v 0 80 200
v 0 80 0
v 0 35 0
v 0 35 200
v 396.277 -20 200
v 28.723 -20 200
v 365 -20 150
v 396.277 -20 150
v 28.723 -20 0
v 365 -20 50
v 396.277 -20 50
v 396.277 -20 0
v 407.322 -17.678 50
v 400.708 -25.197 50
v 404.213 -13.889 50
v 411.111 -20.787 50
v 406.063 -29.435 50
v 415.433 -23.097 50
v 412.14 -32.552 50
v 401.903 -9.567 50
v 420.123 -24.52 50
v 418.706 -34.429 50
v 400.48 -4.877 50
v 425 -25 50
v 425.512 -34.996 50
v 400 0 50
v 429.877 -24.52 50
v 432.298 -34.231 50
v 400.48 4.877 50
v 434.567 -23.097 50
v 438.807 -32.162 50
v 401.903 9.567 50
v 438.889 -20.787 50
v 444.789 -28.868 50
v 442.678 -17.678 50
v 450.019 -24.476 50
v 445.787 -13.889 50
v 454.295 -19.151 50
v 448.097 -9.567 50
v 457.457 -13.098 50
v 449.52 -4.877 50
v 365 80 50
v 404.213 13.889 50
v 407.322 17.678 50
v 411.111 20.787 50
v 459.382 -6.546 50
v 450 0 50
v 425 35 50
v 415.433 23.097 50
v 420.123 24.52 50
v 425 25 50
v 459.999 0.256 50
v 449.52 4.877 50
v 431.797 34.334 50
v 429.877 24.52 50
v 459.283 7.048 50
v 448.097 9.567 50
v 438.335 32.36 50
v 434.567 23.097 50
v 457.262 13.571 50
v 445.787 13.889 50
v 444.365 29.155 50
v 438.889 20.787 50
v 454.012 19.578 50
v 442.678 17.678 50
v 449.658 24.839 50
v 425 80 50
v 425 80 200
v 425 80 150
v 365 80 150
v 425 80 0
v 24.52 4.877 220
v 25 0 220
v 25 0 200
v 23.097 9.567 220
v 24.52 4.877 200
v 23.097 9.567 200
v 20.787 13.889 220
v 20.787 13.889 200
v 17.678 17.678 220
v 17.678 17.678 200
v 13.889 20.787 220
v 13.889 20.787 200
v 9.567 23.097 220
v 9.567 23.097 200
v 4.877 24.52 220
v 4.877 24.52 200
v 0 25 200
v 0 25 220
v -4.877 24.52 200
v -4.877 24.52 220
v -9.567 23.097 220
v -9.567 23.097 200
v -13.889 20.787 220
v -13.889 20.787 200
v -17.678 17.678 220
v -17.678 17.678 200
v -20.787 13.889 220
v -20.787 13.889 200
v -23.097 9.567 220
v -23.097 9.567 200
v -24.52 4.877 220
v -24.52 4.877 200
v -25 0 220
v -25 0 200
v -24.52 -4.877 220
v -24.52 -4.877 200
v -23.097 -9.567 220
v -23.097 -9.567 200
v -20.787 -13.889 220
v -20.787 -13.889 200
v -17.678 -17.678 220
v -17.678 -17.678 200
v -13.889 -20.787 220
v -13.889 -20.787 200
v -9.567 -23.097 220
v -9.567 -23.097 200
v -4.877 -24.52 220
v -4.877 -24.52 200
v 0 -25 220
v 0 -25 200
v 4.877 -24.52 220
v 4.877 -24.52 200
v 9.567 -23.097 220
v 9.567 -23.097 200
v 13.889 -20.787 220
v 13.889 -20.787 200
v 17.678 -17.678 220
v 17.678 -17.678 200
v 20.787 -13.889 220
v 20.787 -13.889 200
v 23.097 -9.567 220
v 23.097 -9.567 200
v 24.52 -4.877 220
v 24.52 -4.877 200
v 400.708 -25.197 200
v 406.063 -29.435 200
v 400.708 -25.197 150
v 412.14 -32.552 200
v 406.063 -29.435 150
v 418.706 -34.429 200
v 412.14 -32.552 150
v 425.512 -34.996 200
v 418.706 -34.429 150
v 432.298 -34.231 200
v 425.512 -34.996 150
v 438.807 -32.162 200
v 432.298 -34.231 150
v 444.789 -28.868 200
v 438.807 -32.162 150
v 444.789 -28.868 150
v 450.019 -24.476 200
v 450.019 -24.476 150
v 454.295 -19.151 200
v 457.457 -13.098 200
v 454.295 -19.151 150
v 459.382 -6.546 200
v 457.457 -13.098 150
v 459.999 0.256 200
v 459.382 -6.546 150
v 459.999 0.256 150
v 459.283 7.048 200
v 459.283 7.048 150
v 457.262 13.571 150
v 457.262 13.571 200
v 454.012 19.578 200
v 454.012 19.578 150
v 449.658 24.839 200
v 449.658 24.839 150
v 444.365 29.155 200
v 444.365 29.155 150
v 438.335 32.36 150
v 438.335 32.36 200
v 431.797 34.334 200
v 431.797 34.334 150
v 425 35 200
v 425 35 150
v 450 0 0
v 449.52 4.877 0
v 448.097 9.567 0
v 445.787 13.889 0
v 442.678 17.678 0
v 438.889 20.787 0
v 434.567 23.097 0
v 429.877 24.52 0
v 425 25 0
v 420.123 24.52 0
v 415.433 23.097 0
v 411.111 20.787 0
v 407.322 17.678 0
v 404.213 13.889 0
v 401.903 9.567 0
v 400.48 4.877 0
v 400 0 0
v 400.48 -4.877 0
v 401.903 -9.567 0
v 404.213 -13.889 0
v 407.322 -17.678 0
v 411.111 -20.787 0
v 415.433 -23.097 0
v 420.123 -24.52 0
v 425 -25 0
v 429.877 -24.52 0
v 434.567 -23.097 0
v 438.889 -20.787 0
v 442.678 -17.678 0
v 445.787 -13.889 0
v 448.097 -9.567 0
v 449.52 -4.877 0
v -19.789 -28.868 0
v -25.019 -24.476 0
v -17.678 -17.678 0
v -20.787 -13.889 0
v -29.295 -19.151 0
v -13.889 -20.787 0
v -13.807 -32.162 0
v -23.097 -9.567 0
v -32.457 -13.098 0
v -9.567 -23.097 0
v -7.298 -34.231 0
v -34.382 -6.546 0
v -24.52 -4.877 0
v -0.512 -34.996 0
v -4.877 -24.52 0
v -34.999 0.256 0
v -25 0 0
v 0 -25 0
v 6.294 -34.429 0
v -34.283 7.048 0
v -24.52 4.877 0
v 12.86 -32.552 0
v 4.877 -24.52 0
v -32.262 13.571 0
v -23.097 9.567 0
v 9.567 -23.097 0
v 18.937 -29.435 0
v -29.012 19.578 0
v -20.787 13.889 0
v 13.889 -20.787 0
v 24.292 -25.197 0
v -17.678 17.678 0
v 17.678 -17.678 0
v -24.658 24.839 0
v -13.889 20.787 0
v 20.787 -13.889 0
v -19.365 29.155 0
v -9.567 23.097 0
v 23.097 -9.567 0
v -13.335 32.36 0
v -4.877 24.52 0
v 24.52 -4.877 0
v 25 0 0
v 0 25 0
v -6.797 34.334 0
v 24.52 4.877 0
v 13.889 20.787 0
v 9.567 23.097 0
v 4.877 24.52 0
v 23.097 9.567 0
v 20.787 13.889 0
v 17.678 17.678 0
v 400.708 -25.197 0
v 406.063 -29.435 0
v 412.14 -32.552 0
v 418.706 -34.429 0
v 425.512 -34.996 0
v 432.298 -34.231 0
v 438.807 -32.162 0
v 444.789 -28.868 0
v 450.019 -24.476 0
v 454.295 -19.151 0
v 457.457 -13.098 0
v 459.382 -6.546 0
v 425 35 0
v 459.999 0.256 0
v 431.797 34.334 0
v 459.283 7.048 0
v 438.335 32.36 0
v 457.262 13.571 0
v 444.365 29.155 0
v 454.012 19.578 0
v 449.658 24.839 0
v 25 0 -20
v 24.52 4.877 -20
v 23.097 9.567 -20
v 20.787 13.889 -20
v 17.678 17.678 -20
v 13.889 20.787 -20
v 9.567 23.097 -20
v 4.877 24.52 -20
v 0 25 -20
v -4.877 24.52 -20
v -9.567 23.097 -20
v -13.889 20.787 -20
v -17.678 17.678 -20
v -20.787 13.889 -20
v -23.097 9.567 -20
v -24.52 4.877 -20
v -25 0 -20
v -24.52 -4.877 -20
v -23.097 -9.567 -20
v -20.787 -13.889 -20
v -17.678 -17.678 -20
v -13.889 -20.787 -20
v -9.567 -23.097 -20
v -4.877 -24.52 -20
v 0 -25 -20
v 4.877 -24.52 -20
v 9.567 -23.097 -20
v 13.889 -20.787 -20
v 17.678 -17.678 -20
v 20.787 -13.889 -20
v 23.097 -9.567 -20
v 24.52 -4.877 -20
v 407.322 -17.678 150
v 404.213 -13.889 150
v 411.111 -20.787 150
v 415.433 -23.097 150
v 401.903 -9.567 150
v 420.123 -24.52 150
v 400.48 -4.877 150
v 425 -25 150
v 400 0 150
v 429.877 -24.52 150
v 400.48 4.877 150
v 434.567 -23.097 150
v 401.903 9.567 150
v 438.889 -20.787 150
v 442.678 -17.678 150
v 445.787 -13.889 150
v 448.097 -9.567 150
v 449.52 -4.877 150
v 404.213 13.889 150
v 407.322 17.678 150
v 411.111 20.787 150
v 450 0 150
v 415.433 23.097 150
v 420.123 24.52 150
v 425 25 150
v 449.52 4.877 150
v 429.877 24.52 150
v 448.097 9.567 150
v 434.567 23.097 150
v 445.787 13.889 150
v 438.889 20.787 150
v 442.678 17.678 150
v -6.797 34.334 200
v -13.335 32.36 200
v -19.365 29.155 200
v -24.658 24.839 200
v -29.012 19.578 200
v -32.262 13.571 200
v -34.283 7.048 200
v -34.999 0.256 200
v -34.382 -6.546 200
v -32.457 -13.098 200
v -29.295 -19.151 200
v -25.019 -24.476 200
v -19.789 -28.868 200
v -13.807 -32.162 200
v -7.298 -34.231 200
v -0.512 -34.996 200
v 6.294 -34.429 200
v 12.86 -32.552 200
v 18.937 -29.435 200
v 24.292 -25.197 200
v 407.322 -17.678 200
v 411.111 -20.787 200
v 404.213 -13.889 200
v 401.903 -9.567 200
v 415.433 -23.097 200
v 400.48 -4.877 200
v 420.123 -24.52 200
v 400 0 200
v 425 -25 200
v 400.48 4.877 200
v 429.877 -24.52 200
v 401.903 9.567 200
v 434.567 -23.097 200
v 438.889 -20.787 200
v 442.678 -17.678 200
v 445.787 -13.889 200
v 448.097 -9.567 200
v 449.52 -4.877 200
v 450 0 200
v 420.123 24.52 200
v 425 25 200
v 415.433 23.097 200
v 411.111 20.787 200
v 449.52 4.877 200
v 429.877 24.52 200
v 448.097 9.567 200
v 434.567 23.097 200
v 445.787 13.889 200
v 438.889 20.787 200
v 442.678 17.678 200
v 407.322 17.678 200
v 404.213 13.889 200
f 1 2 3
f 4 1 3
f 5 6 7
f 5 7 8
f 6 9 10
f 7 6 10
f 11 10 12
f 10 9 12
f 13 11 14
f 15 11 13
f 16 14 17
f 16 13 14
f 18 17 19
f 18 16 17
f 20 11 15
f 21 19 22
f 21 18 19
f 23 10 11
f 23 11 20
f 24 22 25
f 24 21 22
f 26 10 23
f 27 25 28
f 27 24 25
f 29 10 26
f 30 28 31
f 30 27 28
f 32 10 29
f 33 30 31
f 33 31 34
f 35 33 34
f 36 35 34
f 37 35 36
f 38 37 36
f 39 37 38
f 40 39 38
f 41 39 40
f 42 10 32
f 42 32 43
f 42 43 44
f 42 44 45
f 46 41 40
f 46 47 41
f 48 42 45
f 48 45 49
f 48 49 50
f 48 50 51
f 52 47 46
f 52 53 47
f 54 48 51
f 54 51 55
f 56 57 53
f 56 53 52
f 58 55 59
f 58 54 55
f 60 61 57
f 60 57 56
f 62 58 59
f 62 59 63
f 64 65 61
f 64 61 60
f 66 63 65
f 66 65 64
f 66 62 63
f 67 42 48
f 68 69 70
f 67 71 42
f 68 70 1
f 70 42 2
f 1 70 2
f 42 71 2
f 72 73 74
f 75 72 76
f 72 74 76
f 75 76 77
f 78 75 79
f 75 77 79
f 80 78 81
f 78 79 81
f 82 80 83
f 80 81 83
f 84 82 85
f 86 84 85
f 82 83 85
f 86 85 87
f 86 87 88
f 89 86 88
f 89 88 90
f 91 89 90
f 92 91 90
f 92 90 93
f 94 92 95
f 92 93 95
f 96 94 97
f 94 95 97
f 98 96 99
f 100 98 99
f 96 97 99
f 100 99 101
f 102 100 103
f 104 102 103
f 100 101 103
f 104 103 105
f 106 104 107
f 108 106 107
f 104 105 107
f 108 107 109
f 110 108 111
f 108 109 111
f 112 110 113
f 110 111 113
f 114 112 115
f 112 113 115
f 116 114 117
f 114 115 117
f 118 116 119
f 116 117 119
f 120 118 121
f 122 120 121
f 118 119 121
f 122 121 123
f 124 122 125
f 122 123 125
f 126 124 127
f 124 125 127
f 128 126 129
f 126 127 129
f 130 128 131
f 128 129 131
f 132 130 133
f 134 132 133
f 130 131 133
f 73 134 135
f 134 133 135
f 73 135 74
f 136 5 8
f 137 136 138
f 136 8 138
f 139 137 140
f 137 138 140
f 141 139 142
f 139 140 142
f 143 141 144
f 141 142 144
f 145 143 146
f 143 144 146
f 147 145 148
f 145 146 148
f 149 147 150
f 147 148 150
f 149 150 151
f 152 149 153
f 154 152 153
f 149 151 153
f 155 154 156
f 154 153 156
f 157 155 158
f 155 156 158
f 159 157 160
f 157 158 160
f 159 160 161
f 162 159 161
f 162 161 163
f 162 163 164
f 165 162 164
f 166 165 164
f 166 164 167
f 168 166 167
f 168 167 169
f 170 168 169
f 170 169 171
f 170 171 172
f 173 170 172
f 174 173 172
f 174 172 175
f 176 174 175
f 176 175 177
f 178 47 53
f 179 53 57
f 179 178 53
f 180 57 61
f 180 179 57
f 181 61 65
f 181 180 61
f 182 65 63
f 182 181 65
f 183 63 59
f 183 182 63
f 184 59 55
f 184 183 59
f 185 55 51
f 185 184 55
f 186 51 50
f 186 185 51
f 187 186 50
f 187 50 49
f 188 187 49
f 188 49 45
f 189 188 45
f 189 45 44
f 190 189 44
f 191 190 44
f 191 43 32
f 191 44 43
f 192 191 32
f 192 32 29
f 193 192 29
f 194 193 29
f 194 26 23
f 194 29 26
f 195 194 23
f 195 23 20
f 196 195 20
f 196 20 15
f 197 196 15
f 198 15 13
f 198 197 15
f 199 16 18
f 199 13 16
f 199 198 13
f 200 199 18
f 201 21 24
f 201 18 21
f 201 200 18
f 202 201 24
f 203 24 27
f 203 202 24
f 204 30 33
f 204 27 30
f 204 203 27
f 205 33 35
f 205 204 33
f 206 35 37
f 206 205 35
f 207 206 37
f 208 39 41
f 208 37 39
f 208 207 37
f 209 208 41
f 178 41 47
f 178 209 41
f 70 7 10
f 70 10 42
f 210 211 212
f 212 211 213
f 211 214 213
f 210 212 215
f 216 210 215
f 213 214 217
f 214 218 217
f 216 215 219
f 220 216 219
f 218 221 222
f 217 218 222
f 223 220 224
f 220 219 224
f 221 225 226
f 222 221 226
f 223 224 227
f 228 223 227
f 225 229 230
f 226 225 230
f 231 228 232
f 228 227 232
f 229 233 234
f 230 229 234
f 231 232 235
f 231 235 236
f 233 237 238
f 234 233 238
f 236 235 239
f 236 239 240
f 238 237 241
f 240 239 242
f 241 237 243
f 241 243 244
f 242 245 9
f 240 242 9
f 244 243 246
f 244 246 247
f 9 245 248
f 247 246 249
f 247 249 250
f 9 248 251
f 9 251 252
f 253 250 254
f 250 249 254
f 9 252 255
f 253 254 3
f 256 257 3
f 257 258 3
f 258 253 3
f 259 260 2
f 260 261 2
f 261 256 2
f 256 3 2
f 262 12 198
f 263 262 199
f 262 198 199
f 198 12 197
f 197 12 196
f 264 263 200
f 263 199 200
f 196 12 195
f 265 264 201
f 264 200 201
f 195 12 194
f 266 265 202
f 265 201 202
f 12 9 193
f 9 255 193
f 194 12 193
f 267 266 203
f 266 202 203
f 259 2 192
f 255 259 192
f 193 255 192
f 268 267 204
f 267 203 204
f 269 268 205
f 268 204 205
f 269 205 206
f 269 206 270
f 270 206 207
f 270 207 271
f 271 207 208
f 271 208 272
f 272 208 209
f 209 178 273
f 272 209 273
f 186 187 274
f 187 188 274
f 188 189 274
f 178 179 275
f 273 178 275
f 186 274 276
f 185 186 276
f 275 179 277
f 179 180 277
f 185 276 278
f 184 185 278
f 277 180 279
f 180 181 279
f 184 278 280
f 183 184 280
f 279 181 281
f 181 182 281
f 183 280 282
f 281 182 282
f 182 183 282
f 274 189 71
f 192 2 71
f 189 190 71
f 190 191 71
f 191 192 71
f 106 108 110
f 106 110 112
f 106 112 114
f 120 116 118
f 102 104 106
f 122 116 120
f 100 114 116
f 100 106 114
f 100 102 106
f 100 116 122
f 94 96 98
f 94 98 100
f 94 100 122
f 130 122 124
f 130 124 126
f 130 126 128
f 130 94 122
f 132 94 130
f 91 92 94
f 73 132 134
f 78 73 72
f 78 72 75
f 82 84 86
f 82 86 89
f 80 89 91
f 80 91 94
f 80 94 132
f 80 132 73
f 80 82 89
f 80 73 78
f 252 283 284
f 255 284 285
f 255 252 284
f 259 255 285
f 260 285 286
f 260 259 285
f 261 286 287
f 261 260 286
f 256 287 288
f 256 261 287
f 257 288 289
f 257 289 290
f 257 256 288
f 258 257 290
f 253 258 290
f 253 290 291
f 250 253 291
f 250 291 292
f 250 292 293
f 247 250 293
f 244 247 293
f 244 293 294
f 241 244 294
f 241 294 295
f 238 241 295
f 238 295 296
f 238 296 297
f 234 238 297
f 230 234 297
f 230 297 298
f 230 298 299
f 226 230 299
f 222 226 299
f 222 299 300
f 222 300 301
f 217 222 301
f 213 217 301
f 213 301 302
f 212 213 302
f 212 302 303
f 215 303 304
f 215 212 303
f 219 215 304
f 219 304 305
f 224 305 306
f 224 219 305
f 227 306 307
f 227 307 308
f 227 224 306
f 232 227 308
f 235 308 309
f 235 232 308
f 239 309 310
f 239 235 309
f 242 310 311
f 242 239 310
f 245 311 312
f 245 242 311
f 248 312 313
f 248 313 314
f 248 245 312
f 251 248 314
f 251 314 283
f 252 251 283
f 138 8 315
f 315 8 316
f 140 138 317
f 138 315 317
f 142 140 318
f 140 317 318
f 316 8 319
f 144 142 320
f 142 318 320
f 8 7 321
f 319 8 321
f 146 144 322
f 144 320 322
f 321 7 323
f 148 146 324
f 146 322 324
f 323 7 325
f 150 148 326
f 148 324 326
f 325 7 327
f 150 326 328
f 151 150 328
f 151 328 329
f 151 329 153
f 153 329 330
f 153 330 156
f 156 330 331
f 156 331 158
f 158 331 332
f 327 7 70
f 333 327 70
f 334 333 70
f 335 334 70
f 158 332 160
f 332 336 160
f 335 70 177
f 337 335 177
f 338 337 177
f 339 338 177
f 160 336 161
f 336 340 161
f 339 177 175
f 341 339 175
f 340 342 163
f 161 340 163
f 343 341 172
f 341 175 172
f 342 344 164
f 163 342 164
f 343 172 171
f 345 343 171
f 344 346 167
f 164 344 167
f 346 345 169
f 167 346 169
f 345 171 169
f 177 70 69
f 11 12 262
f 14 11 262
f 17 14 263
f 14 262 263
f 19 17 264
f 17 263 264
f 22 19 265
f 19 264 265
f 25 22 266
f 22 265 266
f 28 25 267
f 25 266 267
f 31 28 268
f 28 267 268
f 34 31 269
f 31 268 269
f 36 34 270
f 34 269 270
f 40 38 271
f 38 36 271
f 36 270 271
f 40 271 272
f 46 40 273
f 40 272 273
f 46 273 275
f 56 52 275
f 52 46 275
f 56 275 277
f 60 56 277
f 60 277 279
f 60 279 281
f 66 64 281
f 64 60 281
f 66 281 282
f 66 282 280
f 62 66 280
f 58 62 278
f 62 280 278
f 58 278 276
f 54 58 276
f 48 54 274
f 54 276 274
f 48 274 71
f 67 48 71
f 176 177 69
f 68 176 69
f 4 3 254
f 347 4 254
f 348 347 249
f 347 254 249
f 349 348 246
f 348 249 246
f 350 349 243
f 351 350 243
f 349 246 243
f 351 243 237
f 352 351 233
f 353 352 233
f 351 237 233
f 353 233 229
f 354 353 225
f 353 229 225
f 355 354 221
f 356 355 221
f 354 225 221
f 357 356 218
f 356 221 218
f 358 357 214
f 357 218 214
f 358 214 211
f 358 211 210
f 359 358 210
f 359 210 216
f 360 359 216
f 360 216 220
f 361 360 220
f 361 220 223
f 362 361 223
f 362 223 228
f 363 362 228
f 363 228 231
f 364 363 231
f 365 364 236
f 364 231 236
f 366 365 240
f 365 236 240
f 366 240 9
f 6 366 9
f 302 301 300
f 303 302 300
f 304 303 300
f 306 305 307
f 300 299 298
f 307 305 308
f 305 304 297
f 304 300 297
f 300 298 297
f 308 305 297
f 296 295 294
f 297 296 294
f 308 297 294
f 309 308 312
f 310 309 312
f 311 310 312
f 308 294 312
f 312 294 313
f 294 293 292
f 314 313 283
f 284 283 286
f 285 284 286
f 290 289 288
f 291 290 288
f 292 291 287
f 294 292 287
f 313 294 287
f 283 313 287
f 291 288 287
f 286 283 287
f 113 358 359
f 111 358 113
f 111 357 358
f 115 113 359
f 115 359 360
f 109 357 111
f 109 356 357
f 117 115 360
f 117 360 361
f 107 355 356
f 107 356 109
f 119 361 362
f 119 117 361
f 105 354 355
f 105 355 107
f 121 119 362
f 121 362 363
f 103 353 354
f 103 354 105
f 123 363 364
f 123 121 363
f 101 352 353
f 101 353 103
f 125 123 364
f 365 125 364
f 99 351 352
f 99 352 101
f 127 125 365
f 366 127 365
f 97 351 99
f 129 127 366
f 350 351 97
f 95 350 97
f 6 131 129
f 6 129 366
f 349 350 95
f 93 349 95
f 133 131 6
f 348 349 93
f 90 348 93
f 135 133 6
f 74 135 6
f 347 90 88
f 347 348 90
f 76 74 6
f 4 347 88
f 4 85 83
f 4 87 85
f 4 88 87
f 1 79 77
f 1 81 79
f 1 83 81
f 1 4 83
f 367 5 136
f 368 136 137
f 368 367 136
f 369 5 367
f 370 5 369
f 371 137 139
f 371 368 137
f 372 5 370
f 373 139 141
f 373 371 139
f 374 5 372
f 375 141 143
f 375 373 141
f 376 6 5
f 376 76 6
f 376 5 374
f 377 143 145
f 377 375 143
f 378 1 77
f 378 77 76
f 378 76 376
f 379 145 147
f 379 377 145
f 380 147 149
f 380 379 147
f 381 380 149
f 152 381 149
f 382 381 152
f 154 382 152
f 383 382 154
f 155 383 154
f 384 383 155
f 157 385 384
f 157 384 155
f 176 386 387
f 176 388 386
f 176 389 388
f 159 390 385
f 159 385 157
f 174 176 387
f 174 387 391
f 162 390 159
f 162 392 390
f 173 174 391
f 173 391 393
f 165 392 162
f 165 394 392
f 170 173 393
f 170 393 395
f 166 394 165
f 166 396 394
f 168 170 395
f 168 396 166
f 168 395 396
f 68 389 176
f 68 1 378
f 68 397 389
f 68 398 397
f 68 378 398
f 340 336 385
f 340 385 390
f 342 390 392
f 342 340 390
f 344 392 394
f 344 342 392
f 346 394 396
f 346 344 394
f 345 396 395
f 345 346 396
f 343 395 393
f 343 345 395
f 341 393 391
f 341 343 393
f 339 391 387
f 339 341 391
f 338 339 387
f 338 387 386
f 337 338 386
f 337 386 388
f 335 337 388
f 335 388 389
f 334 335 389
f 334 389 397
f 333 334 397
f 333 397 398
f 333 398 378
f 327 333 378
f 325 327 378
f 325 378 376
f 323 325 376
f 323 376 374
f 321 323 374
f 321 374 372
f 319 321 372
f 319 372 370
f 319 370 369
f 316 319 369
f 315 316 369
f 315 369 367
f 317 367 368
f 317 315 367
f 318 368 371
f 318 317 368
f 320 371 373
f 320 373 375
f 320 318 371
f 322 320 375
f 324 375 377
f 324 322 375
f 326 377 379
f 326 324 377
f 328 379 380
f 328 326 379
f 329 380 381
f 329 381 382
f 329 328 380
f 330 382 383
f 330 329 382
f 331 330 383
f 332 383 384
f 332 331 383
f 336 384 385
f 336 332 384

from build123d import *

# Parameters (mm, degrees)
SKETCH1_R                = 25
BOSS_EXTRUDE1_DEPTH      = 200
SKETCH2_R                = 25
BOSS_EXTRUDE2_DEPTH      = 20
BOSS_EXTRUDE2_DEPTH_BACK = 220
CUT_EXTRUDE1_START       = -50
SKETCH3_W                = 128.293241695
SKETCH3_H                = 120
CUT_EXTRUDE1_DEPTH       = 100


with BuildPart() as part:
    # Sketch1 → Boss-Extrude1 (new body)
    with BuildSketch(Plane.XY):
        with BuildLine():
            Line((28.722813233, -20), (396.277186767, -20))
            ThreePointArc((396.277186767, -20), (456.024184115, -16.201851746), (425, 35))
            Line((425, 35), (425, 80))
            Line((425, 80), (0, 80))
            Line((0, 80), (0, 35))
            ThreePointArc((0, 35), (-31.024184115, -16.201851746), (28.722813233, -20))
        make_face()
        with Locations((425, 0)):
            Circle(SKETCH1_R, mode=Mode.SUBTRACT)
    extrude(amount=BOSS_EXTRUDE1_DEPTH)

    # Sketch2 → Boss-Extrude2 (add, two sides)
    with BuildSketch(Plane.XY.offset(200)) as boss_extrude2_sk:
        Circle(SKETCH2_R)
    extrude(amount=BOSS_EXTRUDE2_DEPTH)
    extrude(boss_extrude2_sk.sketch, amount=-BOSS_EXTRUDE2_DEPTH_BACK)

    # Sketch3 → Cut-Extrude1 (cut)
    with BuildSketch(Plane.XY.offset(200).offset(CUT_EXTRUDE1_START)):
        with Locations((429.146620848, 20)):
            Rectangle(SKETCH3_W, SKETCH3_H)
    extrude(amount=-CUT_EXTRUDE1_DEPTH, mode=Mode.SUBTRACT)


solid = part.part
